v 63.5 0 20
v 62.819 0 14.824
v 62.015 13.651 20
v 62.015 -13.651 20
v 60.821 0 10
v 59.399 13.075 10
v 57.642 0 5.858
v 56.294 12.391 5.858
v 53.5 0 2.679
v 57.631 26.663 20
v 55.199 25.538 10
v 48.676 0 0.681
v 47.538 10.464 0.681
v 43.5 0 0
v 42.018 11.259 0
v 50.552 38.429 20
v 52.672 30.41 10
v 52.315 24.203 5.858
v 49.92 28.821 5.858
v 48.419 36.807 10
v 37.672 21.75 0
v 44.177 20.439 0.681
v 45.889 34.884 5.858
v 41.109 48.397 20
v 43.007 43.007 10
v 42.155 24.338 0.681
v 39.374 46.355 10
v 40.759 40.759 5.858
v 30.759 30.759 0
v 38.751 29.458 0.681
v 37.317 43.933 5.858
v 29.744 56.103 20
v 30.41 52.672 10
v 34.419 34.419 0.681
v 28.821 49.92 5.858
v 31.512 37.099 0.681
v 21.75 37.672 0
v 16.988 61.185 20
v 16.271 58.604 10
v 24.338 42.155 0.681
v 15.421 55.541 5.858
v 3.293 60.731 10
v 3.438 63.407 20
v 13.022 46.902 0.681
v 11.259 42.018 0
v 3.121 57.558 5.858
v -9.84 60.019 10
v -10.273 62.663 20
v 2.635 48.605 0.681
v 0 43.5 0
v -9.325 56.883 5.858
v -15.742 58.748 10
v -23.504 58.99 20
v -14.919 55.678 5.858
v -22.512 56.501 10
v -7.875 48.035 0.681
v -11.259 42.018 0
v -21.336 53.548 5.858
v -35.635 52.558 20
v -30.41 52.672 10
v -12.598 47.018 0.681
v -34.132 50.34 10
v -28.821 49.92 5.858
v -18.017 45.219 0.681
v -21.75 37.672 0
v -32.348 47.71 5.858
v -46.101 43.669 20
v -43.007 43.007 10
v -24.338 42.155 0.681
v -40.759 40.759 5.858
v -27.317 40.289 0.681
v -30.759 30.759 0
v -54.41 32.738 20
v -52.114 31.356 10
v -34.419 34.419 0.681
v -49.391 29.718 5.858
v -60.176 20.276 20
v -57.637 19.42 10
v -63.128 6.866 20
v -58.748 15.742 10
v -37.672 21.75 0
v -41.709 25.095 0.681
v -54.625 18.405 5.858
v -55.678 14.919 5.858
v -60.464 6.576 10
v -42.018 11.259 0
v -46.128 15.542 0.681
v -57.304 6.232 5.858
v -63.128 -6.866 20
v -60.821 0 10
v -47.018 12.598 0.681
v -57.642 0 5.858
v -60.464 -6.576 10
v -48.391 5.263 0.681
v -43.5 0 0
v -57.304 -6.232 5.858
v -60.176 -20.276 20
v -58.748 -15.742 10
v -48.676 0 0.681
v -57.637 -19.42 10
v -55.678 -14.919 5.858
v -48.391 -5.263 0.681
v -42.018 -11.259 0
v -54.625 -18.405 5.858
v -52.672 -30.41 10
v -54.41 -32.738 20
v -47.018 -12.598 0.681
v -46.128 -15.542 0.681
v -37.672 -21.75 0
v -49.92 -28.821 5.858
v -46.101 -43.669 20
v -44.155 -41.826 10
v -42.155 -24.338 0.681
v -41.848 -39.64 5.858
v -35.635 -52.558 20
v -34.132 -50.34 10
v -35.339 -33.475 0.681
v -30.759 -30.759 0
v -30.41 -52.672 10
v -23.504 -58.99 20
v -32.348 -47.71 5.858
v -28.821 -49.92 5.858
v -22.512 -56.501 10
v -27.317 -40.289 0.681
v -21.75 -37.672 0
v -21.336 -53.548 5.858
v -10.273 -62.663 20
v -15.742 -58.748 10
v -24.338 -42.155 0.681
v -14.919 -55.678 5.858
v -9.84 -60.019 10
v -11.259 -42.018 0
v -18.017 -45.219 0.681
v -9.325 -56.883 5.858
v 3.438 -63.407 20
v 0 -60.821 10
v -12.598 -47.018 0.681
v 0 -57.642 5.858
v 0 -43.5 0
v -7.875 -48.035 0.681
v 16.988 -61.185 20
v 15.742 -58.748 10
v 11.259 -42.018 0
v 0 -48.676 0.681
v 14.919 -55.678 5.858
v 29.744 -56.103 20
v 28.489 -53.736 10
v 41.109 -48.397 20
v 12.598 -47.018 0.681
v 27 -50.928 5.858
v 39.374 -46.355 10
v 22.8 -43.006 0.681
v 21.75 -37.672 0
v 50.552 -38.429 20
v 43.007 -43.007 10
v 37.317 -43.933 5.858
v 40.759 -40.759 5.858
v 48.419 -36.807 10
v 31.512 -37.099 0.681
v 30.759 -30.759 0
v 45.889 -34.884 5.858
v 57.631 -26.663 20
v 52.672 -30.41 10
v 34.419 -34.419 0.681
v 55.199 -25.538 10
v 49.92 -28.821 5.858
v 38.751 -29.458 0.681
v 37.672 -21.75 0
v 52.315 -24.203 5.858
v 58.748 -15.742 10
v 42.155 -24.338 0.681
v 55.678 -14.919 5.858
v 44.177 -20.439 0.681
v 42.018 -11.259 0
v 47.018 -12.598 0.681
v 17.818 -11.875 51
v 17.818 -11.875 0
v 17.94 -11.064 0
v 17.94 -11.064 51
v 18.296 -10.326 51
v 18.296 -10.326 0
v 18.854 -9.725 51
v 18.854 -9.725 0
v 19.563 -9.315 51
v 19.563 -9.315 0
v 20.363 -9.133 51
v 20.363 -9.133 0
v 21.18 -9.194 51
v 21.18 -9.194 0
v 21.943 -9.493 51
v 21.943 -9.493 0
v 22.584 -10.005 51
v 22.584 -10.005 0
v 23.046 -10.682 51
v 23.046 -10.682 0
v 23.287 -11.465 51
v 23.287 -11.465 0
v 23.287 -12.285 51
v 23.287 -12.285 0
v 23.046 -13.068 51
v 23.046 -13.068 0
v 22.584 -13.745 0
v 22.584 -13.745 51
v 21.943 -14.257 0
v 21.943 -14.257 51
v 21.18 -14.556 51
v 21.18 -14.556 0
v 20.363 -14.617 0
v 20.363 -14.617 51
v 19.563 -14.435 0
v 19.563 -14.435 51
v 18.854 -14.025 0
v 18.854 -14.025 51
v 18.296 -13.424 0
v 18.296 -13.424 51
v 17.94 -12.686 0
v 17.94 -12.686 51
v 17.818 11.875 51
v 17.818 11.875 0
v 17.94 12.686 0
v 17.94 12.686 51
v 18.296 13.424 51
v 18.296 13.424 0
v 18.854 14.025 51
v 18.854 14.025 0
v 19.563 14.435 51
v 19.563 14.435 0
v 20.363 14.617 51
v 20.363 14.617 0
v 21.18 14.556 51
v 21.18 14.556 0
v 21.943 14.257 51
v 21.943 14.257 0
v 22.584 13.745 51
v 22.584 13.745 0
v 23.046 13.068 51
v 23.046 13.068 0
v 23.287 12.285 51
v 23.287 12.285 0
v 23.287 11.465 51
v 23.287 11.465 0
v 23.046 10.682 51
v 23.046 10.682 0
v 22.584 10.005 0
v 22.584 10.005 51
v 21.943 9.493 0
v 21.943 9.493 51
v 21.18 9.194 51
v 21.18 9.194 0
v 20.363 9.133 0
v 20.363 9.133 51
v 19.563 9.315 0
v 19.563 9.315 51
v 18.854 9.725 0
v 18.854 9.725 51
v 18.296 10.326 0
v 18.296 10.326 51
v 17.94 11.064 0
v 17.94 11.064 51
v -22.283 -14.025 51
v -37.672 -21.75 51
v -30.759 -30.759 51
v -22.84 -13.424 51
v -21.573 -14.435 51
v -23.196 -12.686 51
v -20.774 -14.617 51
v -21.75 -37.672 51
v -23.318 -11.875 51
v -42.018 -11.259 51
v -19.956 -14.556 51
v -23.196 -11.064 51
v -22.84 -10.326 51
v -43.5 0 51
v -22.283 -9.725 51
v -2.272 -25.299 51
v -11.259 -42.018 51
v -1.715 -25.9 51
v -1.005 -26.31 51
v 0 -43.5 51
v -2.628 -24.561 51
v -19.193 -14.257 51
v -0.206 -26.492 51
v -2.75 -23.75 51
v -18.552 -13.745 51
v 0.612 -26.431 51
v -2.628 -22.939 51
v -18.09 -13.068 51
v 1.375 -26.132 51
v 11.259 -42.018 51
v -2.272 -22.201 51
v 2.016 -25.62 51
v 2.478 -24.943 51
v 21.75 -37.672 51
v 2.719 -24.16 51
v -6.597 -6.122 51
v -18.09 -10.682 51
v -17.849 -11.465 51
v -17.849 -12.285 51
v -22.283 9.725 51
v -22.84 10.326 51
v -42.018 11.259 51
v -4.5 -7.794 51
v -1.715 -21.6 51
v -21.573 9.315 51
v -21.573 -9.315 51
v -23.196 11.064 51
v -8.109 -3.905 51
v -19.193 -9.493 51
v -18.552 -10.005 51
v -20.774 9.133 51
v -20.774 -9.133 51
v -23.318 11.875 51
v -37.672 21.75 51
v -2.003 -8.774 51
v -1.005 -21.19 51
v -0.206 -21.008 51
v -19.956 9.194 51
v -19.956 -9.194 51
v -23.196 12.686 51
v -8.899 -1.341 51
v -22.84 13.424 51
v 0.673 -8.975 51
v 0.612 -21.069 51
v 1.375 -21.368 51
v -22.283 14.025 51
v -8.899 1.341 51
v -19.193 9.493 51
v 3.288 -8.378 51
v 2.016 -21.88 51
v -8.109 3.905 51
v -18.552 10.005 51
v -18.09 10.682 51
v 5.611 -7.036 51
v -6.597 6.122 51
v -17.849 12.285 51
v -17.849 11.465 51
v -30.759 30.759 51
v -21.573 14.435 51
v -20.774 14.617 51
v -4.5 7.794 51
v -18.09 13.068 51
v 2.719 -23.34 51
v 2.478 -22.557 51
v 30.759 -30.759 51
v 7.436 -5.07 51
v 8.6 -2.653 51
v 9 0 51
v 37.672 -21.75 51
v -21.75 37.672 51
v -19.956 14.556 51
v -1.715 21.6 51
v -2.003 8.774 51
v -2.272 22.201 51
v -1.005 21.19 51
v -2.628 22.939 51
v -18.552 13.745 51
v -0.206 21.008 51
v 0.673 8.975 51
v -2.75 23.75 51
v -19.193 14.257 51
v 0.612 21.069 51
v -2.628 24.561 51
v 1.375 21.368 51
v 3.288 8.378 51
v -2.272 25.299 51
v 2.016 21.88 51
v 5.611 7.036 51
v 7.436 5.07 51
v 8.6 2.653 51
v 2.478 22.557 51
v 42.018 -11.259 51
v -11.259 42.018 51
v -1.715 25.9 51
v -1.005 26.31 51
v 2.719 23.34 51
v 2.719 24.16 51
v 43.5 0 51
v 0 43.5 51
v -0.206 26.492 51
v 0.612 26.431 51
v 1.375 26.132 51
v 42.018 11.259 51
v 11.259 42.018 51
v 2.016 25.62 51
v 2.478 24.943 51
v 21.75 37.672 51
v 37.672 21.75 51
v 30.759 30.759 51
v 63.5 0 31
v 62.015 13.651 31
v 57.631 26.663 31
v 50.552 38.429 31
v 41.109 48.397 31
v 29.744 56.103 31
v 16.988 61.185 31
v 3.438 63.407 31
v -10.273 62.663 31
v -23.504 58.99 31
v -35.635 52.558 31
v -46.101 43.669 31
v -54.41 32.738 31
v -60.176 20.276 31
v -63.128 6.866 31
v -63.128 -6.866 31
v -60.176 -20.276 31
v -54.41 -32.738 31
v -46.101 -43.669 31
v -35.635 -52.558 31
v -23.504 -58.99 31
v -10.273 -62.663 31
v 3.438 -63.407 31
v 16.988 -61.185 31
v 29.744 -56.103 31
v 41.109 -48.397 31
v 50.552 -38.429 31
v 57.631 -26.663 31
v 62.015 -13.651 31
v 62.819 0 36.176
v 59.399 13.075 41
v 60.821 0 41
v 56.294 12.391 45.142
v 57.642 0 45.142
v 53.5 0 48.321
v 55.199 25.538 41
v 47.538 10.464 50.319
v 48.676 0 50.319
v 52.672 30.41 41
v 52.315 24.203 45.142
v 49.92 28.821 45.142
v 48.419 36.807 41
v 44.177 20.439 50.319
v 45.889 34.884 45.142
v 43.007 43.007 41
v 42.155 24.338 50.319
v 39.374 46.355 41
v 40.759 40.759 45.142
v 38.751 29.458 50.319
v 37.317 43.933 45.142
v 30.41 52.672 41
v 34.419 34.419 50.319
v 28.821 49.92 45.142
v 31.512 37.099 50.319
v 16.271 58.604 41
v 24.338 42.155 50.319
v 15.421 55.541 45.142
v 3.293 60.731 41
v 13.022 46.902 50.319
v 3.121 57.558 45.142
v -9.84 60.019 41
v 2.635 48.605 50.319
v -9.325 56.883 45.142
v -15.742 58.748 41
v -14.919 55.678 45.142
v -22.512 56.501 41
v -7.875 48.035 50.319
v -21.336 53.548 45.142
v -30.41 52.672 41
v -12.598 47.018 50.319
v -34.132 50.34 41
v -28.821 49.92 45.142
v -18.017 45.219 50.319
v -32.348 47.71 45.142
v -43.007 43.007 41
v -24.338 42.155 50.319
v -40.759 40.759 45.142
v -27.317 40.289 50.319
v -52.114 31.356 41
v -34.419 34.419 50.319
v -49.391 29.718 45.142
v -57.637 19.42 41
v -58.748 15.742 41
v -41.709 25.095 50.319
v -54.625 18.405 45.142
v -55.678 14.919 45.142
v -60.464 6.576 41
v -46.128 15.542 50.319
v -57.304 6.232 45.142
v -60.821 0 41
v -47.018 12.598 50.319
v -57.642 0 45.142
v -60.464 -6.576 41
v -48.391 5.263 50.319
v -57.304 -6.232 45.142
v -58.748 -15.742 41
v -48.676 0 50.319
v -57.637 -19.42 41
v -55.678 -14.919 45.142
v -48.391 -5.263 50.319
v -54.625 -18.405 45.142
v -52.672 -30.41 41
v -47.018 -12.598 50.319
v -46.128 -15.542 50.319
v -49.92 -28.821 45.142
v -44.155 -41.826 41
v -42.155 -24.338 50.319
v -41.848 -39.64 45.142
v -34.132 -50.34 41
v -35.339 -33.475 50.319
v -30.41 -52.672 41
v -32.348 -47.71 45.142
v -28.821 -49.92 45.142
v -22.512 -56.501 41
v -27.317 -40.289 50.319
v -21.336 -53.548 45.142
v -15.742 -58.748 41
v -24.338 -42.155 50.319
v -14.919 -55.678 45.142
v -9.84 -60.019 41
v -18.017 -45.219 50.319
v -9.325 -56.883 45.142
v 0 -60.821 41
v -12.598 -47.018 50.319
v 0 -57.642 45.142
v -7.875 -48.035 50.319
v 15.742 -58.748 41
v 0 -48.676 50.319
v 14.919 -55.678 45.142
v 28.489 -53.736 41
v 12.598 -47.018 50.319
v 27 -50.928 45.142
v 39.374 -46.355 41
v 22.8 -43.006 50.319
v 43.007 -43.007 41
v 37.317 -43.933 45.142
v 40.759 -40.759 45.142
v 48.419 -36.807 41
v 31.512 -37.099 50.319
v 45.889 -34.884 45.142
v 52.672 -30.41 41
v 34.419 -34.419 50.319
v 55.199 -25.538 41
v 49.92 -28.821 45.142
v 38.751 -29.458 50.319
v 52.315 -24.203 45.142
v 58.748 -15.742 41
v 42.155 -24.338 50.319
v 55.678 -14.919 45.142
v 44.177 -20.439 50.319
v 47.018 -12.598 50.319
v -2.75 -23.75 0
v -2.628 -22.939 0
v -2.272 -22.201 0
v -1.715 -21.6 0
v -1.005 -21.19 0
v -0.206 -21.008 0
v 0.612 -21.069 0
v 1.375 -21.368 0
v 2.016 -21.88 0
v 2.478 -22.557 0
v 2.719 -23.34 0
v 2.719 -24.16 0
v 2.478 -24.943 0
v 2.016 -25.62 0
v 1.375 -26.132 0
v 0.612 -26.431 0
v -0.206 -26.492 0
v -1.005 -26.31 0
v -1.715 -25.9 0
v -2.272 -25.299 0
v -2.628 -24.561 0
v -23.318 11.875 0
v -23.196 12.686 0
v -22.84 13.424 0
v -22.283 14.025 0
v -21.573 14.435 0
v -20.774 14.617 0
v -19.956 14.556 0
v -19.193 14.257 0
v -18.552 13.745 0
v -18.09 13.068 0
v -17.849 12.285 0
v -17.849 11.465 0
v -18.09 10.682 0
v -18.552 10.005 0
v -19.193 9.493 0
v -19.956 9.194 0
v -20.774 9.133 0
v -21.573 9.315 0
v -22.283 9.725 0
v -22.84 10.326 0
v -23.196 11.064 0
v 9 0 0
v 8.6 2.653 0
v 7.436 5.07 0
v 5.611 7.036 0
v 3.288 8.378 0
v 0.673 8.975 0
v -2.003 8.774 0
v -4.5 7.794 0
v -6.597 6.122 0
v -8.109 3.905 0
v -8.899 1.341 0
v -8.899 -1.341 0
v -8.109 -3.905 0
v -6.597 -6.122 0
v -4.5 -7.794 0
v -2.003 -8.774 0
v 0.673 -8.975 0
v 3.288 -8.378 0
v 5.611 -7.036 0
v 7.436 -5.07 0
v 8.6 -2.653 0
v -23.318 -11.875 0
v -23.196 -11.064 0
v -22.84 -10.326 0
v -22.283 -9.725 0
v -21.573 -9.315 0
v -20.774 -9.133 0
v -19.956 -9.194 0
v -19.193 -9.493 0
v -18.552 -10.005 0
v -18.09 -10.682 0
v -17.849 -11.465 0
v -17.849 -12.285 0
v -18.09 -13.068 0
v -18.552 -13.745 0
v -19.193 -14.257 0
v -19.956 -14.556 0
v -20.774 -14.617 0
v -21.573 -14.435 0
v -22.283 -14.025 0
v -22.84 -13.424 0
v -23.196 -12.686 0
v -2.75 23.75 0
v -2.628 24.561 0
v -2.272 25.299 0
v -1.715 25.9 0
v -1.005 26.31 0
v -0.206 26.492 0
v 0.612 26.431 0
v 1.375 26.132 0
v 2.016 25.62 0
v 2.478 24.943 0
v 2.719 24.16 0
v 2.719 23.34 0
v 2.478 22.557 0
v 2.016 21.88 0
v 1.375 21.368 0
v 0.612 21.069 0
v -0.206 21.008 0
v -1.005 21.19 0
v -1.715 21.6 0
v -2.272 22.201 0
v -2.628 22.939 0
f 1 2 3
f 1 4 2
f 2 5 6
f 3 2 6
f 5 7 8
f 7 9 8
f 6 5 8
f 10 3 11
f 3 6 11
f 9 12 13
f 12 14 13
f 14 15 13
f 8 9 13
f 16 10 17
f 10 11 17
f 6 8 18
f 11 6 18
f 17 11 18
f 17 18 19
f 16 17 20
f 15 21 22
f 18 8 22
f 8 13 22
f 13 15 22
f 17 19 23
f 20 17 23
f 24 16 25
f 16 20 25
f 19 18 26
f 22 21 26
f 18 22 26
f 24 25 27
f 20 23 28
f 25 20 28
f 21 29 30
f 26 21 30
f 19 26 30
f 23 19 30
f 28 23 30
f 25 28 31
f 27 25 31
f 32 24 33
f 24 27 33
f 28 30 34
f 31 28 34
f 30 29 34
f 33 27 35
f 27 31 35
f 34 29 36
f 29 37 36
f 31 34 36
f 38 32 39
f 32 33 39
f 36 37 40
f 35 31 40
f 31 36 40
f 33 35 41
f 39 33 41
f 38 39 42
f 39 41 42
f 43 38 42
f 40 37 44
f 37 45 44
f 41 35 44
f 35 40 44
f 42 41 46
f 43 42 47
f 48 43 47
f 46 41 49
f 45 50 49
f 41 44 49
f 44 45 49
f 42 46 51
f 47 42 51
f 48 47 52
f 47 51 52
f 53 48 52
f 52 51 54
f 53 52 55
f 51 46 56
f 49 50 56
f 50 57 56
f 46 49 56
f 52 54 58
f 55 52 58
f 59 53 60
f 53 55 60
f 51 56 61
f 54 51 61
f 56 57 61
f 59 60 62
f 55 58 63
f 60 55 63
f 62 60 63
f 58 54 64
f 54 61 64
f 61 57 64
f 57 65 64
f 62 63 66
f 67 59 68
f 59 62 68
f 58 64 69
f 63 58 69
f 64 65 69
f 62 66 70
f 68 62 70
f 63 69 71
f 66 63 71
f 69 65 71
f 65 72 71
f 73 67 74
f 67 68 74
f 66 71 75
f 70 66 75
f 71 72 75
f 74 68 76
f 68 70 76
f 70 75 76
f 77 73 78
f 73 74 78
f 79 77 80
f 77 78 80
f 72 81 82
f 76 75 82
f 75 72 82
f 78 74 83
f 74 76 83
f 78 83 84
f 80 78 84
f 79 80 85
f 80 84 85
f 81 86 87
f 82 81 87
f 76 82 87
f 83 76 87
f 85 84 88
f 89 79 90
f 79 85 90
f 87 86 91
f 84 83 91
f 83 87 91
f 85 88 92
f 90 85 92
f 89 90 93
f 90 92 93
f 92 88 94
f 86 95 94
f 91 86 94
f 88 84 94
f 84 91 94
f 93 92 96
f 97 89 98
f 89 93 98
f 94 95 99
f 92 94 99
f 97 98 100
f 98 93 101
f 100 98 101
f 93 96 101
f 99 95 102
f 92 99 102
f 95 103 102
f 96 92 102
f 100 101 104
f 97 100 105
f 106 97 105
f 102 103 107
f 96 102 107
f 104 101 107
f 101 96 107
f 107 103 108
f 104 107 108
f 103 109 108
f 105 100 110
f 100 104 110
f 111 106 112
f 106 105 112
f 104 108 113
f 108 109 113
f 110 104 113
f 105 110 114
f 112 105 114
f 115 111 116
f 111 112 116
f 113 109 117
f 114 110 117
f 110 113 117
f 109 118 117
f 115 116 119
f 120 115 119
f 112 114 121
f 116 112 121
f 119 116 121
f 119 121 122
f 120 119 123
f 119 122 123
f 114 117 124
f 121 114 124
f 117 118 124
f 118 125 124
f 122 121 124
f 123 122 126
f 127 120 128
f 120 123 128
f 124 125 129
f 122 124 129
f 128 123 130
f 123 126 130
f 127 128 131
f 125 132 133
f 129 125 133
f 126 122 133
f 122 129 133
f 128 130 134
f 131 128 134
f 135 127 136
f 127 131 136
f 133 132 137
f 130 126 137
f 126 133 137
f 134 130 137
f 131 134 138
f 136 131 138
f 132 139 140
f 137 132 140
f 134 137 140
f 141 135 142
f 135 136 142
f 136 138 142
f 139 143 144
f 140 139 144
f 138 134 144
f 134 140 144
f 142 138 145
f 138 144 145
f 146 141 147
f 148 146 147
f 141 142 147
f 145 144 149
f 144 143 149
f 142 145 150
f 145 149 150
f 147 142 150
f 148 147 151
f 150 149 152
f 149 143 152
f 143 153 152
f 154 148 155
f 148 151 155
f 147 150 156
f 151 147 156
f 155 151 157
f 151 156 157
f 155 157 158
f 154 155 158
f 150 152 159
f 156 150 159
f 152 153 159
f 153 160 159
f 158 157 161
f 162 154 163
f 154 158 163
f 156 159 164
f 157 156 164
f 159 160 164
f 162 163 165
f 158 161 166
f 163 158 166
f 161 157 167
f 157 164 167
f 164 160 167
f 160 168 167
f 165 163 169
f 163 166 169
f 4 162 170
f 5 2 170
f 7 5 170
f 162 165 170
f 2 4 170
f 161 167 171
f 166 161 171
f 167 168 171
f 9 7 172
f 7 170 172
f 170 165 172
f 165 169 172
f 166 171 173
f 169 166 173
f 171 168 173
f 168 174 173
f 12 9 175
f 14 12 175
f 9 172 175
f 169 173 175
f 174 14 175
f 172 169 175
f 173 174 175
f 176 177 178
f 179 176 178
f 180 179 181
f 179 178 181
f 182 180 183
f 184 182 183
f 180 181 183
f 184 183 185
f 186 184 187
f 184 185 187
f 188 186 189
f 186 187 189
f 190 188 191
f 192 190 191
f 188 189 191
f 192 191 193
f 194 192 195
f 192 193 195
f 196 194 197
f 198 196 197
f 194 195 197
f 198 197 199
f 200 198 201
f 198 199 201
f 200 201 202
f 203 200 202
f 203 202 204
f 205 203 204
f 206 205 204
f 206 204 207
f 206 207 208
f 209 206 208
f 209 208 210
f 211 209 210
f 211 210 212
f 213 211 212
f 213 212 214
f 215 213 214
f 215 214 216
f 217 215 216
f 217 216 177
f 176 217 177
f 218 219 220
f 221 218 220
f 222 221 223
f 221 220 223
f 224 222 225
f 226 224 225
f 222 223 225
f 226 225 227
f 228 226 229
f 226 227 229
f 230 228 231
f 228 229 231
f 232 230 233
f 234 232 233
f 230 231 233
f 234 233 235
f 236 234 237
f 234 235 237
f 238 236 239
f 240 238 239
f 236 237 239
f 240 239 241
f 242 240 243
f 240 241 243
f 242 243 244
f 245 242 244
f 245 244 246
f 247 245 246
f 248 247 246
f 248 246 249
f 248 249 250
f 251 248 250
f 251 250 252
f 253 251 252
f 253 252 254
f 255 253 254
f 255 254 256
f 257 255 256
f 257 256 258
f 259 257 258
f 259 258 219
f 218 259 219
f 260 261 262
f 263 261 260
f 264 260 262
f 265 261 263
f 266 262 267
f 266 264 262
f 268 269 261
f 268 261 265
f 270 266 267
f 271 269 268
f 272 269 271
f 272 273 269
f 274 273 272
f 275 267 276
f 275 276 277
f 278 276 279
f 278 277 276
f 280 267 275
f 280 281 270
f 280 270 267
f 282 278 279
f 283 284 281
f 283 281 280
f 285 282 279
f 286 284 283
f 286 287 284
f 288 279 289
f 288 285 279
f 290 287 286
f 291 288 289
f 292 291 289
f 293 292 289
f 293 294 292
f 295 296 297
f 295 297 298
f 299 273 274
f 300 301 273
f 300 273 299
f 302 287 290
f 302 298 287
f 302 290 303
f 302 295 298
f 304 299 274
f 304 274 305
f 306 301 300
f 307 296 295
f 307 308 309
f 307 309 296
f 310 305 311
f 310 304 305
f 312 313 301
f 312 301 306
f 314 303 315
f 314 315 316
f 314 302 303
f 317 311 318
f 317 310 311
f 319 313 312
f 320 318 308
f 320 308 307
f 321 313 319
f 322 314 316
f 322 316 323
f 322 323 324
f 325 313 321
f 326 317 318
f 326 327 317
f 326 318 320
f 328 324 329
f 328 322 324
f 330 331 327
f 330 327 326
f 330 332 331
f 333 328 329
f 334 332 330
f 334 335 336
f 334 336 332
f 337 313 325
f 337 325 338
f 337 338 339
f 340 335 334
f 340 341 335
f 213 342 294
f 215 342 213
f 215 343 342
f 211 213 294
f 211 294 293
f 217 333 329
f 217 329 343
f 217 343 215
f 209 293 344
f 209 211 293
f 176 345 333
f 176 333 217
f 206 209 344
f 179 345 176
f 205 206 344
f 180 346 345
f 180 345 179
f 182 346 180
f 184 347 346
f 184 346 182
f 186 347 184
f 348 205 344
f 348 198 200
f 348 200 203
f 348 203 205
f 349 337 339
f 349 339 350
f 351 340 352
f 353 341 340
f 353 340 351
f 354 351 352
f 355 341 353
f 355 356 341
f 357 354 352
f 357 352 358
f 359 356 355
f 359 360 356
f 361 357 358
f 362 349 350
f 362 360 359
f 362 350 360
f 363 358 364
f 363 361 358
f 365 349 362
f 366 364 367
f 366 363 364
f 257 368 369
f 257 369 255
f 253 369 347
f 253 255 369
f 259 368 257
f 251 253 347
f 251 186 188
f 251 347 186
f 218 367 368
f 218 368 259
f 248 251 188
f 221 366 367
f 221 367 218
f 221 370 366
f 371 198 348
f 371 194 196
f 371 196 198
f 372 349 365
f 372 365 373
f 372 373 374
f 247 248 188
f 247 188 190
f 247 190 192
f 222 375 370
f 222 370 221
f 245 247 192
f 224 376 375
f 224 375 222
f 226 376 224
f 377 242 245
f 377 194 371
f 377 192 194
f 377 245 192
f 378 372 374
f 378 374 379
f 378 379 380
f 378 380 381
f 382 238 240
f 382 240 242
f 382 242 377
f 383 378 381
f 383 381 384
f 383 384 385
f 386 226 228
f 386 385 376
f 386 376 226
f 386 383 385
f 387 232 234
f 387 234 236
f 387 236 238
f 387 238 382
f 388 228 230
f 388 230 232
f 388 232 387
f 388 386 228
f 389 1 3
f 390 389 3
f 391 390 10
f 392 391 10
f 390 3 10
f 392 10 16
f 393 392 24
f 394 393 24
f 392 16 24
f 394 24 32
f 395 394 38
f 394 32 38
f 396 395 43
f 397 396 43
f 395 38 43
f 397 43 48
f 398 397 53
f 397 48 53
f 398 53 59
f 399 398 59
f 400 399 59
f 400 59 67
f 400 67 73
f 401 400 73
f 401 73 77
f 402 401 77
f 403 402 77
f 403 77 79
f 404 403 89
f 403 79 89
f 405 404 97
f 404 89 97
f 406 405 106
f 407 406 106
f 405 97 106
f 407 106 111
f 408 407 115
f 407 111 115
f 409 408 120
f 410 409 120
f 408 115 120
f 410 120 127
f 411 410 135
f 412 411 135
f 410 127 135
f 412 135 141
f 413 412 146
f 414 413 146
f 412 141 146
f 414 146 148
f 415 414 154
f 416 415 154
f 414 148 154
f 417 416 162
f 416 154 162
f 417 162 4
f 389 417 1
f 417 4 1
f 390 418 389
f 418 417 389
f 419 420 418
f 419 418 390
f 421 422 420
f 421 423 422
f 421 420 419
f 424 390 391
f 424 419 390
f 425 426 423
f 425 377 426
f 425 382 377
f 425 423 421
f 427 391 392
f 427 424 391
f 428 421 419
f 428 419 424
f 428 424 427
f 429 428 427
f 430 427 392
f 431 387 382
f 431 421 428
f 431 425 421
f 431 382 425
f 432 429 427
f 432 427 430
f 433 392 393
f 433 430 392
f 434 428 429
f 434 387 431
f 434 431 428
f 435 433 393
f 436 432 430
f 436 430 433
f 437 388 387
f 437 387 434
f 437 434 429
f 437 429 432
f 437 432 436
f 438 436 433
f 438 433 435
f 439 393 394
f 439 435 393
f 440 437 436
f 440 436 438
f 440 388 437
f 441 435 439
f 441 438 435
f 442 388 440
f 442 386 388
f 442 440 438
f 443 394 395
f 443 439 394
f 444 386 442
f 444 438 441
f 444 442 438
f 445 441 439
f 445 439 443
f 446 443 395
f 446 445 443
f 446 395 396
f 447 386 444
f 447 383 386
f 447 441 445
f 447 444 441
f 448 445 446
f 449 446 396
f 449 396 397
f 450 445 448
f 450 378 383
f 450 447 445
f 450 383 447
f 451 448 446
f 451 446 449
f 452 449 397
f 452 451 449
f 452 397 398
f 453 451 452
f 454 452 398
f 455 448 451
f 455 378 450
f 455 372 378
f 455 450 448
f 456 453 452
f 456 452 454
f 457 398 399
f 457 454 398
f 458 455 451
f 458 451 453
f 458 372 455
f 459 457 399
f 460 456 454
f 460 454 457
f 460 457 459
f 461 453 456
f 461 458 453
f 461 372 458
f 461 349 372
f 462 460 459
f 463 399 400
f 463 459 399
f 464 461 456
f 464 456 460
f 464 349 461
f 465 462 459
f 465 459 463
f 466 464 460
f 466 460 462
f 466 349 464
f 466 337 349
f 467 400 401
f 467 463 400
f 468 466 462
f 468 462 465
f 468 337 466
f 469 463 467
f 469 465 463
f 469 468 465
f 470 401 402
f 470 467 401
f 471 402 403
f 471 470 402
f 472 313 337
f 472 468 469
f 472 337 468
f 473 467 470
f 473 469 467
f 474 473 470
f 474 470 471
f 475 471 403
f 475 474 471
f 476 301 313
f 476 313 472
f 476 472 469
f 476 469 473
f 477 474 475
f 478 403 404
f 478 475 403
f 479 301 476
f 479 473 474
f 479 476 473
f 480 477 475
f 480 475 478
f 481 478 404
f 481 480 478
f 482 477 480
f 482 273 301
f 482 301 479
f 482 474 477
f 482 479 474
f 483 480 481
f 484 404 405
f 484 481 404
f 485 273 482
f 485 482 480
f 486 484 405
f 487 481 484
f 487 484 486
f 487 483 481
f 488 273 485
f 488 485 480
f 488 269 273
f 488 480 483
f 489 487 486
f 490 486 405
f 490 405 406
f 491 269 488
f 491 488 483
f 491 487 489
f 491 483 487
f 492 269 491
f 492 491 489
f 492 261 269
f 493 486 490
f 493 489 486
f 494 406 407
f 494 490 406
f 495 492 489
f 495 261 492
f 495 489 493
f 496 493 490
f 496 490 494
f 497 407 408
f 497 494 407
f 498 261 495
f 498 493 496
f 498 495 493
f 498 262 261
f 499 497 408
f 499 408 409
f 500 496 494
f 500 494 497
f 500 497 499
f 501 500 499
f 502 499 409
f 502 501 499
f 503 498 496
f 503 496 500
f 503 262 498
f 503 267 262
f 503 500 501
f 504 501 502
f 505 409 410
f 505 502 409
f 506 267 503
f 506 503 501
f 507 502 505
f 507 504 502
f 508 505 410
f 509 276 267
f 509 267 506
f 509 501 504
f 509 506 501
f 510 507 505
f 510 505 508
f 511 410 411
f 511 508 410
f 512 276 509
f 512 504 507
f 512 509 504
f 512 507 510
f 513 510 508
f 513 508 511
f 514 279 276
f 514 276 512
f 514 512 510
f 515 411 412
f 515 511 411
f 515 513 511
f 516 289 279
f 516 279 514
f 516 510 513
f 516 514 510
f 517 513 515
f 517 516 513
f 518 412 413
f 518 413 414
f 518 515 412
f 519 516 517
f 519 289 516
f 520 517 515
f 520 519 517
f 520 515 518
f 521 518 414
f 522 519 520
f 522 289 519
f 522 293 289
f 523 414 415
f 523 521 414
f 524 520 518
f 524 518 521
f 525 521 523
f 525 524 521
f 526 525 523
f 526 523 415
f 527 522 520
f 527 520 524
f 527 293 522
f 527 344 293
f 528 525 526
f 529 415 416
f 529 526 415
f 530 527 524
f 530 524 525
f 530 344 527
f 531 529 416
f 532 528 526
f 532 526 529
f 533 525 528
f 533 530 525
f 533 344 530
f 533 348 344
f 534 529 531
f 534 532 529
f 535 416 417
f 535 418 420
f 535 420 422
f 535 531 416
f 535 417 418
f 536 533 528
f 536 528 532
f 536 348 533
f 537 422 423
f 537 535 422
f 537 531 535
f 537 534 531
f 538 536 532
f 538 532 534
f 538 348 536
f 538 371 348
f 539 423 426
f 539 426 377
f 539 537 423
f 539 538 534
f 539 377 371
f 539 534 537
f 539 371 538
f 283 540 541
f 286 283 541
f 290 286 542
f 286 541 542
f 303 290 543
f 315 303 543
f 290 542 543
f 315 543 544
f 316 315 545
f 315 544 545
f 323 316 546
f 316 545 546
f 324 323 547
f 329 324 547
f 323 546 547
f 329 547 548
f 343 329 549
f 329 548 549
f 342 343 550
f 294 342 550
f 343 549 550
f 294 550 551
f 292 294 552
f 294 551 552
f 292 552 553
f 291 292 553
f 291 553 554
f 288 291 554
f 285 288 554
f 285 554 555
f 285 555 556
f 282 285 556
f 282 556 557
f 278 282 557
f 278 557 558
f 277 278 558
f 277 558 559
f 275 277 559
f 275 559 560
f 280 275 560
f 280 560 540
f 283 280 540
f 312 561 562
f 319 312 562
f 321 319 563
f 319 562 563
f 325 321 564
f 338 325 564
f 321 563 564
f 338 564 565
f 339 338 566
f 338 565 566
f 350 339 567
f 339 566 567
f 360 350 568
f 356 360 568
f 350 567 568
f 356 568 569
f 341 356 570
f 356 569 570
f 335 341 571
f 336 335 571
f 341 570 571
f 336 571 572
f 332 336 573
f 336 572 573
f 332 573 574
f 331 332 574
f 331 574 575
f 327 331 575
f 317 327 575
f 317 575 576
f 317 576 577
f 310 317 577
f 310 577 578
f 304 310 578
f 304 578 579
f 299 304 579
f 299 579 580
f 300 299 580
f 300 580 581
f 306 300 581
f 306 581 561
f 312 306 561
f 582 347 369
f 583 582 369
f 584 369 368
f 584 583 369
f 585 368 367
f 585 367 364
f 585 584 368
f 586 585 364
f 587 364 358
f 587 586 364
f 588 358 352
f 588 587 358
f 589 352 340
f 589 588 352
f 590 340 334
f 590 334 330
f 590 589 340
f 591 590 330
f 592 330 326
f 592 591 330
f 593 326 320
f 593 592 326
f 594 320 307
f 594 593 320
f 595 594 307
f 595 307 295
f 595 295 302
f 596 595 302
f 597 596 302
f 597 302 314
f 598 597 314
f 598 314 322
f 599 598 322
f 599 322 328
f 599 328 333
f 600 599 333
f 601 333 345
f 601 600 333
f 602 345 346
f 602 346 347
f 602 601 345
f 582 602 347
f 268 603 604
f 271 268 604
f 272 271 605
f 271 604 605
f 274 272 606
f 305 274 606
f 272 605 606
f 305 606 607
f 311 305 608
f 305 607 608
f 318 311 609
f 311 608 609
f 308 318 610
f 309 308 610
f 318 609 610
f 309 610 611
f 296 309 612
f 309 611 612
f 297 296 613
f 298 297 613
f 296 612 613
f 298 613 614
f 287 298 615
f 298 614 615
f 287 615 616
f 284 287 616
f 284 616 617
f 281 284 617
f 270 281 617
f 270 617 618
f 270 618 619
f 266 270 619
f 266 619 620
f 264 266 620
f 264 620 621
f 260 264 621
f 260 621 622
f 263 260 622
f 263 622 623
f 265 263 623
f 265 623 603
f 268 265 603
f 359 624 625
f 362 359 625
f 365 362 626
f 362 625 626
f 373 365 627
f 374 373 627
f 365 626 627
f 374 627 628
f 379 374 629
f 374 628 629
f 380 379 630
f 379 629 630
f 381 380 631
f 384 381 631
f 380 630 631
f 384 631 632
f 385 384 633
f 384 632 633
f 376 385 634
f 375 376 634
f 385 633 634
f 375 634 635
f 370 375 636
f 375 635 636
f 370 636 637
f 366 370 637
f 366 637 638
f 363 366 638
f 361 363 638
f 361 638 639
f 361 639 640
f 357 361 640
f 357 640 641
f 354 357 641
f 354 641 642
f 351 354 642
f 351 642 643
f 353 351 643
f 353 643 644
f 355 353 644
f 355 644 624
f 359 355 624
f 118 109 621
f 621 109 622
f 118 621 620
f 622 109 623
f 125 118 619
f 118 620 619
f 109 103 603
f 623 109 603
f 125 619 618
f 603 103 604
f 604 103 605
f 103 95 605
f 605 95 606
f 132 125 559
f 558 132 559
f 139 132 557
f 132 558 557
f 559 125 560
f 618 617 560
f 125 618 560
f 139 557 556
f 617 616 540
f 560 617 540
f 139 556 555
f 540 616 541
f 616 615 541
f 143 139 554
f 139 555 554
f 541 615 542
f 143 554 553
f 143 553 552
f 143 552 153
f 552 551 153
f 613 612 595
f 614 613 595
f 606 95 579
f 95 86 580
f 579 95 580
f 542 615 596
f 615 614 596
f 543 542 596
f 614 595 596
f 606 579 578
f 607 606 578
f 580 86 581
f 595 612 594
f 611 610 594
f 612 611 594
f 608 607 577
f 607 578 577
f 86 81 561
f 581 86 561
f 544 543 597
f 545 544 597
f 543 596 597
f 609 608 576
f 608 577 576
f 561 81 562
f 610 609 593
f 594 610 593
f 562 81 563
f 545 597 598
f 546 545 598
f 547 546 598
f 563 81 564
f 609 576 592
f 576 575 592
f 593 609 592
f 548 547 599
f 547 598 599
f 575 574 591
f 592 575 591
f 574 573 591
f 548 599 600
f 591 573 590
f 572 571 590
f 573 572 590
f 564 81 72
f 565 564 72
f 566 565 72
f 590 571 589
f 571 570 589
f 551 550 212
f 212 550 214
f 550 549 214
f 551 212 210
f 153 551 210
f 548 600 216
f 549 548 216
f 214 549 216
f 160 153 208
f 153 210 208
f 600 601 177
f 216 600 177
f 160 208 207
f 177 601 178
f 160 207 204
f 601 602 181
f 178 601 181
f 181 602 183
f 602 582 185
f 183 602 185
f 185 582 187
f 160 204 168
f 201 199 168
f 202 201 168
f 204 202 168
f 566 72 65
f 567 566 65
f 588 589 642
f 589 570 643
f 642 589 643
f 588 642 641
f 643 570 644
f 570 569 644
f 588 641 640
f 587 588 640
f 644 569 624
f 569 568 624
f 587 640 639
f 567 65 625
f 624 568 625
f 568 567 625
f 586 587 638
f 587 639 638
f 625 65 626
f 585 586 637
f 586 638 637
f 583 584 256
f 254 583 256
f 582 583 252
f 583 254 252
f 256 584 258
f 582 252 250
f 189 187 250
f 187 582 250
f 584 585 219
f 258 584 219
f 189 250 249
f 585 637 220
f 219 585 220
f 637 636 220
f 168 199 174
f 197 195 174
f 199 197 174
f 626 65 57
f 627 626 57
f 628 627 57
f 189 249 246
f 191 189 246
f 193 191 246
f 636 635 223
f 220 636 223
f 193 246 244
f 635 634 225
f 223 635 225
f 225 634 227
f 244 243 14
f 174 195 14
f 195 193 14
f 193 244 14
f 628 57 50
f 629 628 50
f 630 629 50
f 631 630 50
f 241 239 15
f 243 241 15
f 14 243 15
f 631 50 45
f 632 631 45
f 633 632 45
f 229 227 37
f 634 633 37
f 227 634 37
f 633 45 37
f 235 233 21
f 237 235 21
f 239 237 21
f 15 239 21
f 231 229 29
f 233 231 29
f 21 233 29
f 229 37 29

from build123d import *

# Parameters (mm, degrees)
SKETCH1_R            = 63.5
SKETCH1_R_2          = 9
BOSS_EXTRUDE1_DEPTH  = 51
FILLET1_R            = 20
M5_CLEARANCE_HOLE1_D = 5.5


with BuildPart() as part:
    # Sketch1 → Boss-Extrude1 (new body)
    with BuildSketch(Plane.XY):
        Circle(SKETCH1_R)
        Circle(SKETCH1_R_2, mode=Mode.SUBTRACT)
    extrude(amount=BOSS_EXTRUDE1_DEPTH)

    # Fillet1
    fillet1_edges = [part.edges().sort_by_distance(p)[0] for p in [
        (-63.5, 0, 0),
        (-63.5, 0, 51),
    ]]
    fillet(fillet1_edges, radius=FILLET1_R)

    # M5 Clearance Hole1 (through all)
    with Locations(Plane.XY.offset(51)):
        with Locations((0, 23.75), (20.56810334, 11.875), (20.56810334, -11.875), (0, -23.75), (-20.56810334, -11.875), (-20.56810334, 11.875)):
            Hole(M5_CLEARANCE_HOLE1_D / 2)


solid = part.part
